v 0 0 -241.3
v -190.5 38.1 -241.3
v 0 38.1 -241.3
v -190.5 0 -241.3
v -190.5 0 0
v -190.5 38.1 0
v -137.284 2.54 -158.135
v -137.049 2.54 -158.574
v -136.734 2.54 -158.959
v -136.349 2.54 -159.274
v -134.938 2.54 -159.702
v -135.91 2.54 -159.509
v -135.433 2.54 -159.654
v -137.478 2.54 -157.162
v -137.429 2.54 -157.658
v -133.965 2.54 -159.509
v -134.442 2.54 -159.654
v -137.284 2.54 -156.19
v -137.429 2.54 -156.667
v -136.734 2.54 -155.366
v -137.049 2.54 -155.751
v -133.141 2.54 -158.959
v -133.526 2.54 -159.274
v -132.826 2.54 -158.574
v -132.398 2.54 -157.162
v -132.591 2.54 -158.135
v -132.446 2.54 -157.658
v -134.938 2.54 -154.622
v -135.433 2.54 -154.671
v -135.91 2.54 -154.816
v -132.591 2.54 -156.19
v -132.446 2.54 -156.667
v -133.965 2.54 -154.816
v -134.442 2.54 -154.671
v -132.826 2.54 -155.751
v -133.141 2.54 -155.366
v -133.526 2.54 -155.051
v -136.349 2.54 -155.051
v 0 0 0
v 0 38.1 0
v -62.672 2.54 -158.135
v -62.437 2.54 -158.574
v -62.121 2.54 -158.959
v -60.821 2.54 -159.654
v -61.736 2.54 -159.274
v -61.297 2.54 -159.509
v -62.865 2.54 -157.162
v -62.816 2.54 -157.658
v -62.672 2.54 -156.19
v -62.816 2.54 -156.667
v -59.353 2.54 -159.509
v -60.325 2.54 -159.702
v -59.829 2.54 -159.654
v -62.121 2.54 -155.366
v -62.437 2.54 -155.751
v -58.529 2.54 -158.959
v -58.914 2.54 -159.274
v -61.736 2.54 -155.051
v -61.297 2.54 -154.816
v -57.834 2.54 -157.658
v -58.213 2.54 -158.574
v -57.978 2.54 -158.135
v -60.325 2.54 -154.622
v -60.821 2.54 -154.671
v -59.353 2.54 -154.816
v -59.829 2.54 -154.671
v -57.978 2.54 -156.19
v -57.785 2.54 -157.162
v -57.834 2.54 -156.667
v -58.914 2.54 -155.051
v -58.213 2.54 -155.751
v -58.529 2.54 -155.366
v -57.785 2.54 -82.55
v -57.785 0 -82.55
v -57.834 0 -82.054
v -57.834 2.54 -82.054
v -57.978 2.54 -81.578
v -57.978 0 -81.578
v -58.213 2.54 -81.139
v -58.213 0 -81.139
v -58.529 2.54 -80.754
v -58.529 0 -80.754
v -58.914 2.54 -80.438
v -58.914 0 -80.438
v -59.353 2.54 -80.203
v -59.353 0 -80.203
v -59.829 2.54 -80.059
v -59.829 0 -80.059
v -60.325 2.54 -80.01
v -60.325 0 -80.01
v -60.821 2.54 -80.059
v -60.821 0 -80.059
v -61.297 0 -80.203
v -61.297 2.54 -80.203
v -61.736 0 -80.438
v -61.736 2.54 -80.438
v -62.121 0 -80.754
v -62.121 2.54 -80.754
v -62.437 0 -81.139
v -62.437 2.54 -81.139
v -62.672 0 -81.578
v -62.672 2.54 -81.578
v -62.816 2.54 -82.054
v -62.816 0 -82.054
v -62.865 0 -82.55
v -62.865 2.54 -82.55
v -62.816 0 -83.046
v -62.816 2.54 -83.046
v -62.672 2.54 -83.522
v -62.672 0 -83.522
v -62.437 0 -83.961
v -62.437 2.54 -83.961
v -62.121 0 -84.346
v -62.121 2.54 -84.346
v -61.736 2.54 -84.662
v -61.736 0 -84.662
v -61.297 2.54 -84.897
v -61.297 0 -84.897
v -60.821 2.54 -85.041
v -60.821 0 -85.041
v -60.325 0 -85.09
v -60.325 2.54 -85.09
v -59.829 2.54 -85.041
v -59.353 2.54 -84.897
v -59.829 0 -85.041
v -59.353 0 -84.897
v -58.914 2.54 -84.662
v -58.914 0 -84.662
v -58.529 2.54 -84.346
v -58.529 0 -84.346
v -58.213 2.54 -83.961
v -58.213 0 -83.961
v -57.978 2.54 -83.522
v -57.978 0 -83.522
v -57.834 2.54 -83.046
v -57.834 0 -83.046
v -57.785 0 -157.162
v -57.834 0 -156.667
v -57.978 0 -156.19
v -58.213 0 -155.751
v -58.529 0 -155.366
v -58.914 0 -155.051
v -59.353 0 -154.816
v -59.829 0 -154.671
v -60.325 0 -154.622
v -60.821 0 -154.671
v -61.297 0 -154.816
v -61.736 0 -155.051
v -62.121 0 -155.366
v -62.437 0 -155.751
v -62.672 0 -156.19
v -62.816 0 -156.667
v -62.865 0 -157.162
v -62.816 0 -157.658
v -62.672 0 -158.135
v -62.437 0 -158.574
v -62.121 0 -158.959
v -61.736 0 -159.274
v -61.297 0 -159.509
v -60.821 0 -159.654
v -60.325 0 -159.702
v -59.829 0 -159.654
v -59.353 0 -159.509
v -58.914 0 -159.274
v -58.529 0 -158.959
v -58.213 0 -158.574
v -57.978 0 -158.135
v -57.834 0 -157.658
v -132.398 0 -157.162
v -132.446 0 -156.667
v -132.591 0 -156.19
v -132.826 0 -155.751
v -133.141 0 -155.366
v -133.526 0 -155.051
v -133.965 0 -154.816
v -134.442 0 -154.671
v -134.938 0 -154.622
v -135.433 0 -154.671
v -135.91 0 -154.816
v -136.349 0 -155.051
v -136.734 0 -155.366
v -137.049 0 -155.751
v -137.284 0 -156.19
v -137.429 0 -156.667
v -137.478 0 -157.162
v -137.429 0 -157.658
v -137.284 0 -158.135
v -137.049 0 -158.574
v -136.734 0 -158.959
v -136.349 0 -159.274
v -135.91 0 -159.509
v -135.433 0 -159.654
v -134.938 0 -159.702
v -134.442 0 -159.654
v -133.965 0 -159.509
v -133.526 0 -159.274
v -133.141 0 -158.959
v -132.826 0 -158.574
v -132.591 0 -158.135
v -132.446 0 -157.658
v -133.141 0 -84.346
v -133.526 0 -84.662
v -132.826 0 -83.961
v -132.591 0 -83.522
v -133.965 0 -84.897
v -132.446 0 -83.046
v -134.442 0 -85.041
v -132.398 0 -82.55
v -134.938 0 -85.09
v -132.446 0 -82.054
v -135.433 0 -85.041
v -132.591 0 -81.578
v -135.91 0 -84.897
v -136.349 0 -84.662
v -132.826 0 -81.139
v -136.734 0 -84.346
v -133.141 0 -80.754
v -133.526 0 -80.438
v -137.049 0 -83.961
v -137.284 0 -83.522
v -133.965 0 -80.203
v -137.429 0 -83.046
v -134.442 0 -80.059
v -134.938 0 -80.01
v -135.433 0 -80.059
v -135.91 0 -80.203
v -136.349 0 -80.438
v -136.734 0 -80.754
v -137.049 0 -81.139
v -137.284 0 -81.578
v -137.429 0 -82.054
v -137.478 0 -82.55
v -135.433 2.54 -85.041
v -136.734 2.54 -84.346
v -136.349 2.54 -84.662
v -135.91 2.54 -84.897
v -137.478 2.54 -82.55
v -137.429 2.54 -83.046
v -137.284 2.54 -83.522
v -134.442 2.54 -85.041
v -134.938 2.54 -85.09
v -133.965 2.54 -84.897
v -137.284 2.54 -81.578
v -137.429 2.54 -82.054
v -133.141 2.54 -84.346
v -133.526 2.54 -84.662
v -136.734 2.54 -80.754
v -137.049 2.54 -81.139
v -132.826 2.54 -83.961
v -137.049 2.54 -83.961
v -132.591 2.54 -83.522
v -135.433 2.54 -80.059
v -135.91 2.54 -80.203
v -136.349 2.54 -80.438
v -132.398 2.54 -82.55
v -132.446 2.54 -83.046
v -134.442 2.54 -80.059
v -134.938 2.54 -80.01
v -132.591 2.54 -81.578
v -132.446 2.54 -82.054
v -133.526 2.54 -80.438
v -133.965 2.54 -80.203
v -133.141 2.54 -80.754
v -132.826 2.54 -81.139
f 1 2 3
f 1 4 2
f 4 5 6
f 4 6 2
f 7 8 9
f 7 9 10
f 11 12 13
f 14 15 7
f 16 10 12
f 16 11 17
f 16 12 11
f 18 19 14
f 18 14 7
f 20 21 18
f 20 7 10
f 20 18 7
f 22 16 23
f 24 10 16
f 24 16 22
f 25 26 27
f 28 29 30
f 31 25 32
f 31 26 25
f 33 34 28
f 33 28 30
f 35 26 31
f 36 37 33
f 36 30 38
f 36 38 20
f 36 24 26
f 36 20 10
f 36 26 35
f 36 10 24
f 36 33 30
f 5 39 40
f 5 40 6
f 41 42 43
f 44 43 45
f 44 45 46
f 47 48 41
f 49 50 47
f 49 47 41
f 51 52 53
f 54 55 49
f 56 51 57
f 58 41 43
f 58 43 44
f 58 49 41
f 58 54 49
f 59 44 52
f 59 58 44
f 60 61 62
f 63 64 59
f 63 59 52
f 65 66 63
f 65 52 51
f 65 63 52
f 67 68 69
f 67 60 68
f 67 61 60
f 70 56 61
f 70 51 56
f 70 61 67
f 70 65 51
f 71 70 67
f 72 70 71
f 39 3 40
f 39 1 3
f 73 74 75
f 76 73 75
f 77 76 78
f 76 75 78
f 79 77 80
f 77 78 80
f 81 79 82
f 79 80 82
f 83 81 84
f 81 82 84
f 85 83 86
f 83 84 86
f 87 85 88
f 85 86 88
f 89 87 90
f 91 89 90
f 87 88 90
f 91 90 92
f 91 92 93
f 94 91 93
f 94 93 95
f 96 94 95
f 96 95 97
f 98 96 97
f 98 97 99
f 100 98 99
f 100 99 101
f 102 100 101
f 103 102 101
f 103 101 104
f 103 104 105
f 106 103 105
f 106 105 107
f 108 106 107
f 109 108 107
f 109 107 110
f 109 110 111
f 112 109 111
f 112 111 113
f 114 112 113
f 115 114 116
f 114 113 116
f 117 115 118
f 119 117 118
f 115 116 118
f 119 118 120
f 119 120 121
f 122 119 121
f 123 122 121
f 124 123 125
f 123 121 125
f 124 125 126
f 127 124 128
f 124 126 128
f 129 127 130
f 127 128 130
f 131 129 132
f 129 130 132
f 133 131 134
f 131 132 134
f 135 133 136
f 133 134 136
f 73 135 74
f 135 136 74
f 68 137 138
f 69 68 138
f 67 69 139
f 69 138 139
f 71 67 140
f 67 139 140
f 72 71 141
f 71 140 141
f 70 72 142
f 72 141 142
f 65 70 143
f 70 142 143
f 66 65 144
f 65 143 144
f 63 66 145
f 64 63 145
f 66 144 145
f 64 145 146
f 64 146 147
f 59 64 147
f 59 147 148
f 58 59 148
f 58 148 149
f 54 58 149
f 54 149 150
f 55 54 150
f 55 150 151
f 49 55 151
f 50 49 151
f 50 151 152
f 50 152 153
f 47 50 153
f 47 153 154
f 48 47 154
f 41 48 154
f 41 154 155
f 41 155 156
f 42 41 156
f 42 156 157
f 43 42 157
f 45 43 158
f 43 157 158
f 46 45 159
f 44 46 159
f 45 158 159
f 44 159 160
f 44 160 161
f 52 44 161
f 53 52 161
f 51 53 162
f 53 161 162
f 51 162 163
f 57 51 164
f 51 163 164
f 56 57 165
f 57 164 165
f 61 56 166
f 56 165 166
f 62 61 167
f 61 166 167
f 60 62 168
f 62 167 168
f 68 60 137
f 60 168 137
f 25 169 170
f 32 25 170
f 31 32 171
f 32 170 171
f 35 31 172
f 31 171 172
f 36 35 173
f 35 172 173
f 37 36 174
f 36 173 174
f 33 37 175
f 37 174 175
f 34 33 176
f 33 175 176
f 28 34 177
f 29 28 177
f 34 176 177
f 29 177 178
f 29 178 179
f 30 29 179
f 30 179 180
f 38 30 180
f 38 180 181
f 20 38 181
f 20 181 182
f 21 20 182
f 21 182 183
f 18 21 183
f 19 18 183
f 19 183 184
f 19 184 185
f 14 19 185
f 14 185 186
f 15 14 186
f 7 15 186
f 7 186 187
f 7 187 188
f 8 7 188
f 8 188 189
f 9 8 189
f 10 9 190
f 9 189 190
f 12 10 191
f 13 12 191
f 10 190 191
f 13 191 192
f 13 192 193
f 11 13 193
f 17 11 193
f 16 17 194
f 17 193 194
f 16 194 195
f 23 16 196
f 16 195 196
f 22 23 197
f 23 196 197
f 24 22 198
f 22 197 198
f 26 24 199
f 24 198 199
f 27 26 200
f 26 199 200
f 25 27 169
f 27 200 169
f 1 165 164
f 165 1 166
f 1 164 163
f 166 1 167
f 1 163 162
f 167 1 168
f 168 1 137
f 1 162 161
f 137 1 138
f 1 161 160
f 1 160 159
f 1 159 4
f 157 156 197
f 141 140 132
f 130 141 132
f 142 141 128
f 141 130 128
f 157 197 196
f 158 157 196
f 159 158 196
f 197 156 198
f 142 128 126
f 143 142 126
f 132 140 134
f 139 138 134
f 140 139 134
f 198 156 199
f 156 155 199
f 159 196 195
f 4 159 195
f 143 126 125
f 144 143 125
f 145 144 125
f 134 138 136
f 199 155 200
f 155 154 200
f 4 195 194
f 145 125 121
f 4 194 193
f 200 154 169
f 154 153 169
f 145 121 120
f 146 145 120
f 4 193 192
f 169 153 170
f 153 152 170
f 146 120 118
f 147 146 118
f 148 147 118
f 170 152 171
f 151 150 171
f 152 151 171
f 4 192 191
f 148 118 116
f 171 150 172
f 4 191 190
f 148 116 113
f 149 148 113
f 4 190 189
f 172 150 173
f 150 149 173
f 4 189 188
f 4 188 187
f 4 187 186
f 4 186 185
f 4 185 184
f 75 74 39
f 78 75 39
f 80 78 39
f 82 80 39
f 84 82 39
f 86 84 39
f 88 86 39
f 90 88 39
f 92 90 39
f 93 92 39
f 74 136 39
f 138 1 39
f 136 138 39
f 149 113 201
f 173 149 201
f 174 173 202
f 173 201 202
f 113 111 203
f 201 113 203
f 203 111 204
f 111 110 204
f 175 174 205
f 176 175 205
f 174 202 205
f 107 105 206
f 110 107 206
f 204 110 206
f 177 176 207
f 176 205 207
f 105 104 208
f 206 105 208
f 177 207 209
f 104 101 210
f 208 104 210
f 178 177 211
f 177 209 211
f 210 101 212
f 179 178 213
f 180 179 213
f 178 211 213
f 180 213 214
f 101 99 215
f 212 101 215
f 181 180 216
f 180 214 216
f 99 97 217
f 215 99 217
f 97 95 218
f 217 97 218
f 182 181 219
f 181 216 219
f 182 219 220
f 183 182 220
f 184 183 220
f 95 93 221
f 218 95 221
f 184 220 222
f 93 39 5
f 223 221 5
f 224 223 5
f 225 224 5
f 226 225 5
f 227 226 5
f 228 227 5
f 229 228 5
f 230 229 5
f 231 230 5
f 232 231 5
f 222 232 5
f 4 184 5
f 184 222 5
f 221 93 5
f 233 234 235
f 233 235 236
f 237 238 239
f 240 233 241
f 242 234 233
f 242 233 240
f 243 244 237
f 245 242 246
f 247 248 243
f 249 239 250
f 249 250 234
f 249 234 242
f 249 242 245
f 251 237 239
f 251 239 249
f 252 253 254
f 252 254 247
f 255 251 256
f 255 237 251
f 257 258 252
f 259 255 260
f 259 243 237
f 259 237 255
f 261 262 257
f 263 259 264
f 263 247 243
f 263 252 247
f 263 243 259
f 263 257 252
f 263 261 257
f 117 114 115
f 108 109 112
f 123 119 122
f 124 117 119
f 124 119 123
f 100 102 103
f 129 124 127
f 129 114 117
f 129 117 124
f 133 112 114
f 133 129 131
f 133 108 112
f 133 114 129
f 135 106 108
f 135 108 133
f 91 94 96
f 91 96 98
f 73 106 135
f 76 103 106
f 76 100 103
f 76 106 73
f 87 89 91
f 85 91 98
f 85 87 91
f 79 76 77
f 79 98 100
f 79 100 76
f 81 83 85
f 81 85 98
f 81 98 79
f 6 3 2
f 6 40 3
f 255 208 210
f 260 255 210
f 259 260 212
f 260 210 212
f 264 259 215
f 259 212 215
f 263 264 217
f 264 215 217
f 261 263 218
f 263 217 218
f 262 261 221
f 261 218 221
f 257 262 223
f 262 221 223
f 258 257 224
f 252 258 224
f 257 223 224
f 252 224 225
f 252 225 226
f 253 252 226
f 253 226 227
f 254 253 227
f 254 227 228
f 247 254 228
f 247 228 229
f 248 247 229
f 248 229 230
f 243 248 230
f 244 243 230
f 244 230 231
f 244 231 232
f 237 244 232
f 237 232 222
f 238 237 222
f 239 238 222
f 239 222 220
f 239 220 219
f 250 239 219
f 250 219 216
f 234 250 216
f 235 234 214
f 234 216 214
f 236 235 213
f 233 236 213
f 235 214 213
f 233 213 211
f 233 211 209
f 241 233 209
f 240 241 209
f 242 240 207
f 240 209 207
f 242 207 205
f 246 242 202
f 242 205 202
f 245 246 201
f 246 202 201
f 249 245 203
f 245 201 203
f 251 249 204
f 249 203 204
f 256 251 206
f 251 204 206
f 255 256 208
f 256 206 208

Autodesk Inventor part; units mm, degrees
ref_plane "YZ Plane" through (0, 0, 0) normal (1, 0, 0) x (0, 1, 0)
ref_plane "XZ Plane" through (0, 0, 0) normal (0, 1, 0) x (-1, 0, 0)
ref_plane "XY Plane" through (0, 0, 0) normal (0, 0, 1) x (1, 0, 0)
sketch "Sketch1" plane through (0, 0, 0) normal (0, 1, 0) x (-1, 0, 0)
  line L0 (0, 0) -> (190.5, 0)
  line L1 (190.5, 0) -> (190.5, -241.3)
  line L2 (190.5, -241.3) -> (0, -241.3)
  line L3 (0, -241.3) -> (0, 0)
  dimension "d0" = 190.5
  dimension "d1" = 241.3
extrude "Extrusion1" add sketch "Sketch1" along normal blind 38.1
sketch "Sketch2" plane through (0, 0, 0) normal (0, -1, 0) x (1, 0, 0)
  circle A0 centre (-134.9375, -157.1625) radius 2.54
  line L0 (-190.5, 0) -> (-190.5, -241.3) projected
  line L1 (0, -241.3) -> (-190.5, -241.3) projected
  circle A1 centre (-60.325, -157.1625) radius 2.54
  circle A2 centre (-134.9375, -82.55) radius 2.54
  circle A3 centre (-60.325, -82.55) radius 2.54
  point P0 (0, 0)
  dimension "d4" = 5.08
  dimension "d5" = 55.5625
  dimension "d6" = 84.1375
  dimension "d7" = 5.08
  dimension "d8" = 5.08
  dimension "d9" = 74.6125
  dimension "d10" = 74.6125
  dimension "d11" = 5.08
  dimension "d12" = 74.6125
  dimension "d13" = 74.6125
extrude "Extrusion2" cut sketch "Sketch2" against normal blind 2.54
properties part number "screen"
